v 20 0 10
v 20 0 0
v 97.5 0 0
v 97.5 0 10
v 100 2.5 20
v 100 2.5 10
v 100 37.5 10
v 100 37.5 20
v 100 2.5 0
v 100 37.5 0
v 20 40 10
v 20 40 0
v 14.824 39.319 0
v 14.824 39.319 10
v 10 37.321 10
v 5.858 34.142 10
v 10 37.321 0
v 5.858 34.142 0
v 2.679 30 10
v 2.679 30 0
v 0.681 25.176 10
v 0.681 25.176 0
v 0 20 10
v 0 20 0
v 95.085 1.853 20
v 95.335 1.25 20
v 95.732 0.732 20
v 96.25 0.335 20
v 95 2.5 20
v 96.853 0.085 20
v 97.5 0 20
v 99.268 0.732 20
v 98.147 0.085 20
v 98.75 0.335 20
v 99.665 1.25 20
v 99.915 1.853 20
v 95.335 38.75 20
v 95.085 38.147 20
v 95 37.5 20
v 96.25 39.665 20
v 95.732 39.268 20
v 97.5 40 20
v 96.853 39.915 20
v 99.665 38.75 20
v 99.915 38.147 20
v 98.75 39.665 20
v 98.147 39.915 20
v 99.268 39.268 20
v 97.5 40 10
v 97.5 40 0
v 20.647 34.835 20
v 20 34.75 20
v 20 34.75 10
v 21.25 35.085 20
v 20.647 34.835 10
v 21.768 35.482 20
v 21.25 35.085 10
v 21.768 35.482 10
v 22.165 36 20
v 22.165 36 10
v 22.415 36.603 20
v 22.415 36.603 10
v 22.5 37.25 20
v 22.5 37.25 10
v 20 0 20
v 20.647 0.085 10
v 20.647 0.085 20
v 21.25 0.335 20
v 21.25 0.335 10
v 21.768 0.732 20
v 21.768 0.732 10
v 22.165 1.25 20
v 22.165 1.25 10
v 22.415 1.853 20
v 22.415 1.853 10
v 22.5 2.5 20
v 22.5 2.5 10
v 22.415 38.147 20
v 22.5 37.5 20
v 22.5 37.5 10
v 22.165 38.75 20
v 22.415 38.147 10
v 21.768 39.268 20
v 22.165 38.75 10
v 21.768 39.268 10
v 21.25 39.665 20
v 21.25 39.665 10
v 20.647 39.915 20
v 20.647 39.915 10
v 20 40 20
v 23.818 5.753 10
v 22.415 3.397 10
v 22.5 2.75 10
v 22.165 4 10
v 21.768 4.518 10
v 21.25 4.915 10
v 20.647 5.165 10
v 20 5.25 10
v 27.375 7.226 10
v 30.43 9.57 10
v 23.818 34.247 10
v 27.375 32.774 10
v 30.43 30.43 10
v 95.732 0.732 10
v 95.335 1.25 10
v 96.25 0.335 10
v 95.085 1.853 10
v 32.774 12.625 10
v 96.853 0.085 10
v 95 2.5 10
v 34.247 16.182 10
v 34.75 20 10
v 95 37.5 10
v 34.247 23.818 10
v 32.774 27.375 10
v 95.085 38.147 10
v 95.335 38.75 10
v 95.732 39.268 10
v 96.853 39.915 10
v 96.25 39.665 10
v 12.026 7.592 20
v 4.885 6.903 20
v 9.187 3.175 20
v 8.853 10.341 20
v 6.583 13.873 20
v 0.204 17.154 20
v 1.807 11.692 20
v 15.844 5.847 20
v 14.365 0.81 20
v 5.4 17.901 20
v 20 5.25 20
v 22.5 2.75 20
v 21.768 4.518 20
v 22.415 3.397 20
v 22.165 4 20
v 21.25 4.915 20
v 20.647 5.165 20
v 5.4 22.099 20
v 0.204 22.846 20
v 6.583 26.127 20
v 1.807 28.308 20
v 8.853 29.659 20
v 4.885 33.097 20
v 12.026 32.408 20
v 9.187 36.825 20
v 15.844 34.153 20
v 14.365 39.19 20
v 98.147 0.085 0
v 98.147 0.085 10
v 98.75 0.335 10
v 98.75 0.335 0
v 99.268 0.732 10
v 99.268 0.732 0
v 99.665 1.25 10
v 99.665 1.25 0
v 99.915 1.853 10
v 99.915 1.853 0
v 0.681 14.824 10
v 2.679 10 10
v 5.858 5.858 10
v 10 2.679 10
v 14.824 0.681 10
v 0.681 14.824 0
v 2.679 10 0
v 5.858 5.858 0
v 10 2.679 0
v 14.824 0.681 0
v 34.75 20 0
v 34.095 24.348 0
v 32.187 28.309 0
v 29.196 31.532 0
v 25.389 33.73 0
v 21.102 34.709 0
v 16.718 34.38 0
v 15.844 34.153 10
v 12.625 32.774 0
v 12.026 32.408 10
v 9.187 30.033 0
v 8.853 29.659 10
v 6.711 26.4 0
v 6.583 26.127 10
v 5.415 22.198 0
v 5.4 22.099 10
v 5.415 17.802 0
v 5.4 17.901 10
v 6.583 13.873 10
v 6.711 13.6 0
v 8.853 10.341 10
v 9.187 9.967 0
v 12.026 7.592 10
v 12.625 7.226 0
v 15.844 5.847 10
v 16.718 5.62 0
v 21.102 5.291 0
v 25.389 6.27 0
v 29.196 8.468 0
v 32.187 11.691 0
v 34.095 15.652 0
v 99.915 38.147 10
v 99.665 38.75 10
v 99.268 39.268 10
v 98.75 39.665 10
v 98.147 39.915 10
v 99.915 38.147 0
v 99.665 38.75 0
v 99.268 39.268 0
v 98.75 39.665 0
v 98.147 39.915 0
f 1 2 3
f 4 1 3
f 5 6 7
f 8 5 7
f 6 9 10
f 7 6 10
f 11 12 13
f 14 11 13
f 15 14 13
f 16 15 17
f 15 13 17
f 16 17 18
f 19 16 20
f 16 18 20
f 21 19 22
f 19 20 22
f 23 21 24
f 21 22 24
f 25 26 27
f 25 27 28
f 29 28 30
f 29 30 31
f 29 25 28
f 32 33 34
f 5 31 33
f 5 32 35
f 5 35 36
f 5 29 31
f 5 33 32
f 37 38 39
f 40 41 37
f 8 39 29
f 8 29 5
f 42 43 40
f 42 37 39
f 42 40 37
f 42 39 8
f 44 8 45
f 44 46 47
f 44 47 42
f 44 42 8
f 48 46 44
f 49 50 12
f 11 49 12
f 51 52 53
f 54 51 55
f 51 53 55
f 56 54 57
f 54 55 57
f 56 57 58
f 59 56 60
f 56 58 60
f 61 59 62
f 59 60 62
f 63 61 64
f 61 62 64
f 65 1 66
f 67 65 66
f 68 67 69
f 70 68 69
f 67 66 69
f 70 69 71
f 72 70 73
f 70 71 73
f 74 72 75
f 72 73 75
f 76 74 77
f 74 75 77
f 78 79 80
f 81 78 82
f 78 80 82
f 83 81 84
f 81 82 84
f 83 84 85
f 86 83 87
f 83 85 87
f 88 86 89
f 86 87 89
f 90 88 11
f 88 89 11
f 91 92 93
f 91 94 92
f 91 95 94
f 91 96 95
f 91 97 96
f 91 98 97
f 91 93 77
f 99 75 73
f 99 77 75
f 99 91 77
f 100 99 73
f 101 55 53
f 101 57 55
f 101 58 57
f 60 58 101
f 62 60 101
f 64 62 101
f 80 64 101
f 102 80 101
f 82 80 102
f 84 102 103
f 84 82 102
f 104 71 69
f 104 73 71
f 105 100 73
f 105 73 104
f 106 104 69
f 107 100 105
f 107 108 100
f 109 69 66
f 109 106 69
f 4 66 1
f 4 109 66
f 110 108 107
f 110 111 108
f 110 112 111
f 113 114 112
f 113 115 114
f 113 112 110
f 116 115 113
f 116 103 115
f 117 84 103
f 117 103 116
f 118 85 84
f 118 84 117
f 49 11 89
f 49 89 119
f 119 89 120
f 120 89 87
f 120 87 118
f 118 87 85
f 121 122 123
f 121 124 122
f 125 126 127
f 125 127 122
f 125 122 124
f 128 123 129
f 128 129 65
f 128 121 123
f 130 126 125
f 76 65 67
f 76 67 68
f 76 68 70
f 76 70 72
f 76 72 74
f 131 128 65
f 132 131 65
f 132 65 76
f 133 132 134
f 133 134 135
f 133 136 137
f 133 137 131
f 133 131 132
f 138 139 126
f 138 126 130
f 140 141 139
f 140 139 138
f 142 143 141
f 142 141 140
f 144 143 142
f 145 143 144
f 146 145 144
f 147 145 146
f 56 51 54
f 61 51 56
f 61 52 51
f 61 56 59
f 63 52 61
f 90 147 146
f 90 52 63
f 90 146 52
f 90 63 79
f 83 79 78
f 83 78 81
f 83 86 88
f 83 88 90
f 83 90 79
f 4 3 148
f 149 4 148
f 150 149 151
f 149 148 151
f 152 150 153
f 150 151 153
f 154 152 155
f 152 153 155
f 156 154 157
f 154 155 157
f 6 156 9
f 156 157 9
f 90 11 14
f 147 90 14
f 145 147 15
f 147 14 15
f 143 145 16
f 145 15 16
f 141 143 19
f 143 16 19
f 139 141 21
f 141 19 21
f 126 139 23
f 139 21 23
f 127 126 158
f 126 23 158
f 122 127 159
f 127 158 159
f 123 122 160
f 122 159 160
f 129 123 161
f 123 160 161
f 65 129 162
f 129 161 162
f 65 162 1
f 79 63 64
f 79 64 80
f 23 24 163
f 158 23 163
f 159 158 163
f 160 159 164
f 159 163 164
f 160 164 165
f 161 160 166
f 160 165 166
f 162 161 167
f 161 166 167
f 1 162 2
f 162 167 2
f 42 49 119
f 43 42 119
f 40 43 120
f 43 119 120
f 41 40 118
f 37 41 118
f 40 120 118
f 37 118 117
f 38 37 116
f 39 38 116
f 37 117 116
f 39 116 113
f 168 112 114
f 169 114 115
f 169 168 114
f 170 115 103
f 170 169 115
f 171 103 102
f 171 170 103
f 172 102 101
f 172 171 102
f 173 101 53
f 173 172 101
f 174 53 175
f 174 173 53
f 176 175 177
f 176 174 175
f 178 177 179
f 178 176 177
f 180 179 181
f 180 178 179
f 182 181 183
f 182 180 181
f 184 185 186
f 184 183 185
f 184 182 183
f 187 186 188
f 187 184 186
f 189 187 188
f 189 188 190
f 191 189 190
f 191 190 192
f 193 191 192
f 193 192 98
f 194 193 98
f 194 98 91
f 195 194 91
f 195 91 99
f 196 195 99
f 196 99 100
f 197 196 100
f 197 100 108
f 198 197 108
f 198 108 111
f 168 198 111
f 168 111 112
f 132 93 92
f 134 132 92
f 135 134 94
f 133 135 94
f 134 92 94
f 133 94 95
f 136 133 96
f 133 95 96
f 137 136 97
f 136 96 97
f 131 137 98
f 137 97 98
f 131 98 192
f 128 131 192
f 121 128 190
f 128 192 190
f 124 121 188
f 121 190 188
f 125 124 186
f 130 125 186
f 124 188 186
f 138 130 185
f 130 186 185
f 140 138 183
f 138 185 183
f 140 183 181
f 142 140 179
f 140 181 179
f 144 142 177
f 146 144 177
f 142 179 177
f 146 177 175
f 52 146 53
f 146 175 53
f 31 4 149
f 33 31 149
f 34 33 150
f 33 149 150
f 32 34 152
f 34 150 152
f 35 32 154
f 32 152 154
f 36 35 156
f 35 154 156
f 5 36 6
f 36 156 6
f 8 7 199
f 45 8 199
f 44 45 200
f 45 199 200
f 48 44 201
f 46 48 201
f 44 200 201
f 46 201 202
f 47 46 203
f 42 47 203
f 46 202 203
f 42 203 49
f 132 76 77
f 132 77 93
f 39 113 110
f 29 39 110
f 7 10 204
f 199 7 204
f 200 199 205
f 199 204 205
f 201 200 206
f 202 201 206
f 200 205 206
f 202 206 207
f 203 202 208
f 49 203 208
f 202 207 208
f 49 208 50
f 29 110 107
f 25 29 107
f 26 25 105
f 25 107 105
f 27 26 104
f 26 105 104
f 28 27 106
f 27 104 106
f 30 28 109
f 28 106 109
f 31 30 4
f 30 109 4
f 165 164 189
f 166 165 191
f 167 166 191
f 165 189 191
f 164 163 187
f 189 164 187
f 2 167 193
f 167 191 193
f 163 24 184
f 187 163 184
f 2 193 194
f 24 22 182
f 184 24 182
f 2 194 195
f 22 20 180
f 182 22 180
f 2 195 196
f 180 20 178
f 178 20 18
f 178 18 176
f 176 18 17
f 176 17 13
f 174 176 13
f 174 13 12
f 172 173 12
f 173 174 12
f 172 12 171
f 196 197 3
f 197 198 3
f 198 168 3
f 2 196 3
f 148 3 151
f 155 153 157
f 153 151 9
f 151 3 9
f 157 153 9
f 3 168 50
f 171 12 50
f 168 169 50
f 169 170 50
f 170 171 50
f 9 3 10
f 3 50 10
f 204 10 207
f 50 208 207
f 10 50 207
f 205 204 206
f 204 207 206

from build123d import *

# Parameters (mm, degrees)
F0_R     = 14.75
F1_DEPTH = 10
F3_DEPTH = 10


# Not quite as in the source:
# - a feature names something its author has since deleted; it is built from what else it names


with BuildPart() as f1:
    # F0 (on Top) → F1 (new body)
    with BuildSketch(Plane.XY):
        with BuildLine():
            ThreePointArc((0, 20), (5.8578643763, 5.8578643763), (20, 0))
            Line((20, 0), (97.5, 0))
            ThreePointArc((97.5, 0), (99.267766953, 0.732233047), (100, 2.5))
            Line((100, 2.5), (100, 37.5))
            ThreePointArc((100, 37.5), (99.267766953, 39.267766953), (97.5, 40))
            Line((97.5, 40), (20, 40))
            ThreePointArc((20, 40), (5.8578643763, 34.1421356237), (0, 20))
        make_face()
        with Locations((20, 20)):
            Circle(F0_R, mode=Mode.SUBTRACT)
    extrude(amount=F1_DEPTH)

    # F2 (on face) → F3 (join)
    with BuildSketch(Plane.XY.offset(10)):
        with BuildLine():
            ThreePointArc((22.5, 37.5), (21.767766953, 39.267766953), (20, 40))
            ThreePointArc((20, 40), (0, 20), (20, 0))
            ThreePointArc((20, 0), (21.767766953, 0.732233047), (22.5, 2.5))
            Line((22.5, 2.5), (22.5, 2.75))
            ThreePointArc((22.5, 2.75), (21.767766953, 4.517766953), (20, 5.25))
            ThreePointArc((20, 5.25), (5.25, 20), (20, 34.75))
            ThreePointArc((20, 34.75), (21.767766953, 35.482233047), (22.5, 37.25))
            Line((22.5, 37.25), (22.5, 37.5))
        make_face()
        with BuildLine():
            ThreePointArc((100, 37.5), (99.267766953, 39.267766953), (97.5, 40))
            ThreePointArc((97.5, 40), (95.732233047, 39.267766953), (95, 37.5))
            Line((95, 37.5), (95, 2.5))
            ThreePointArc((95, 2.5), (95.732233047, 0.732233047), (97.5, 0))
            ThreePointArc((97.5, 0), (99.267766953, 0.732233047), (100, 2.5))
            Line((100, 2.5), (100, 37.5))
        make_face()
    extrude(amount=F3_DEPTH)


solid = f1.part
